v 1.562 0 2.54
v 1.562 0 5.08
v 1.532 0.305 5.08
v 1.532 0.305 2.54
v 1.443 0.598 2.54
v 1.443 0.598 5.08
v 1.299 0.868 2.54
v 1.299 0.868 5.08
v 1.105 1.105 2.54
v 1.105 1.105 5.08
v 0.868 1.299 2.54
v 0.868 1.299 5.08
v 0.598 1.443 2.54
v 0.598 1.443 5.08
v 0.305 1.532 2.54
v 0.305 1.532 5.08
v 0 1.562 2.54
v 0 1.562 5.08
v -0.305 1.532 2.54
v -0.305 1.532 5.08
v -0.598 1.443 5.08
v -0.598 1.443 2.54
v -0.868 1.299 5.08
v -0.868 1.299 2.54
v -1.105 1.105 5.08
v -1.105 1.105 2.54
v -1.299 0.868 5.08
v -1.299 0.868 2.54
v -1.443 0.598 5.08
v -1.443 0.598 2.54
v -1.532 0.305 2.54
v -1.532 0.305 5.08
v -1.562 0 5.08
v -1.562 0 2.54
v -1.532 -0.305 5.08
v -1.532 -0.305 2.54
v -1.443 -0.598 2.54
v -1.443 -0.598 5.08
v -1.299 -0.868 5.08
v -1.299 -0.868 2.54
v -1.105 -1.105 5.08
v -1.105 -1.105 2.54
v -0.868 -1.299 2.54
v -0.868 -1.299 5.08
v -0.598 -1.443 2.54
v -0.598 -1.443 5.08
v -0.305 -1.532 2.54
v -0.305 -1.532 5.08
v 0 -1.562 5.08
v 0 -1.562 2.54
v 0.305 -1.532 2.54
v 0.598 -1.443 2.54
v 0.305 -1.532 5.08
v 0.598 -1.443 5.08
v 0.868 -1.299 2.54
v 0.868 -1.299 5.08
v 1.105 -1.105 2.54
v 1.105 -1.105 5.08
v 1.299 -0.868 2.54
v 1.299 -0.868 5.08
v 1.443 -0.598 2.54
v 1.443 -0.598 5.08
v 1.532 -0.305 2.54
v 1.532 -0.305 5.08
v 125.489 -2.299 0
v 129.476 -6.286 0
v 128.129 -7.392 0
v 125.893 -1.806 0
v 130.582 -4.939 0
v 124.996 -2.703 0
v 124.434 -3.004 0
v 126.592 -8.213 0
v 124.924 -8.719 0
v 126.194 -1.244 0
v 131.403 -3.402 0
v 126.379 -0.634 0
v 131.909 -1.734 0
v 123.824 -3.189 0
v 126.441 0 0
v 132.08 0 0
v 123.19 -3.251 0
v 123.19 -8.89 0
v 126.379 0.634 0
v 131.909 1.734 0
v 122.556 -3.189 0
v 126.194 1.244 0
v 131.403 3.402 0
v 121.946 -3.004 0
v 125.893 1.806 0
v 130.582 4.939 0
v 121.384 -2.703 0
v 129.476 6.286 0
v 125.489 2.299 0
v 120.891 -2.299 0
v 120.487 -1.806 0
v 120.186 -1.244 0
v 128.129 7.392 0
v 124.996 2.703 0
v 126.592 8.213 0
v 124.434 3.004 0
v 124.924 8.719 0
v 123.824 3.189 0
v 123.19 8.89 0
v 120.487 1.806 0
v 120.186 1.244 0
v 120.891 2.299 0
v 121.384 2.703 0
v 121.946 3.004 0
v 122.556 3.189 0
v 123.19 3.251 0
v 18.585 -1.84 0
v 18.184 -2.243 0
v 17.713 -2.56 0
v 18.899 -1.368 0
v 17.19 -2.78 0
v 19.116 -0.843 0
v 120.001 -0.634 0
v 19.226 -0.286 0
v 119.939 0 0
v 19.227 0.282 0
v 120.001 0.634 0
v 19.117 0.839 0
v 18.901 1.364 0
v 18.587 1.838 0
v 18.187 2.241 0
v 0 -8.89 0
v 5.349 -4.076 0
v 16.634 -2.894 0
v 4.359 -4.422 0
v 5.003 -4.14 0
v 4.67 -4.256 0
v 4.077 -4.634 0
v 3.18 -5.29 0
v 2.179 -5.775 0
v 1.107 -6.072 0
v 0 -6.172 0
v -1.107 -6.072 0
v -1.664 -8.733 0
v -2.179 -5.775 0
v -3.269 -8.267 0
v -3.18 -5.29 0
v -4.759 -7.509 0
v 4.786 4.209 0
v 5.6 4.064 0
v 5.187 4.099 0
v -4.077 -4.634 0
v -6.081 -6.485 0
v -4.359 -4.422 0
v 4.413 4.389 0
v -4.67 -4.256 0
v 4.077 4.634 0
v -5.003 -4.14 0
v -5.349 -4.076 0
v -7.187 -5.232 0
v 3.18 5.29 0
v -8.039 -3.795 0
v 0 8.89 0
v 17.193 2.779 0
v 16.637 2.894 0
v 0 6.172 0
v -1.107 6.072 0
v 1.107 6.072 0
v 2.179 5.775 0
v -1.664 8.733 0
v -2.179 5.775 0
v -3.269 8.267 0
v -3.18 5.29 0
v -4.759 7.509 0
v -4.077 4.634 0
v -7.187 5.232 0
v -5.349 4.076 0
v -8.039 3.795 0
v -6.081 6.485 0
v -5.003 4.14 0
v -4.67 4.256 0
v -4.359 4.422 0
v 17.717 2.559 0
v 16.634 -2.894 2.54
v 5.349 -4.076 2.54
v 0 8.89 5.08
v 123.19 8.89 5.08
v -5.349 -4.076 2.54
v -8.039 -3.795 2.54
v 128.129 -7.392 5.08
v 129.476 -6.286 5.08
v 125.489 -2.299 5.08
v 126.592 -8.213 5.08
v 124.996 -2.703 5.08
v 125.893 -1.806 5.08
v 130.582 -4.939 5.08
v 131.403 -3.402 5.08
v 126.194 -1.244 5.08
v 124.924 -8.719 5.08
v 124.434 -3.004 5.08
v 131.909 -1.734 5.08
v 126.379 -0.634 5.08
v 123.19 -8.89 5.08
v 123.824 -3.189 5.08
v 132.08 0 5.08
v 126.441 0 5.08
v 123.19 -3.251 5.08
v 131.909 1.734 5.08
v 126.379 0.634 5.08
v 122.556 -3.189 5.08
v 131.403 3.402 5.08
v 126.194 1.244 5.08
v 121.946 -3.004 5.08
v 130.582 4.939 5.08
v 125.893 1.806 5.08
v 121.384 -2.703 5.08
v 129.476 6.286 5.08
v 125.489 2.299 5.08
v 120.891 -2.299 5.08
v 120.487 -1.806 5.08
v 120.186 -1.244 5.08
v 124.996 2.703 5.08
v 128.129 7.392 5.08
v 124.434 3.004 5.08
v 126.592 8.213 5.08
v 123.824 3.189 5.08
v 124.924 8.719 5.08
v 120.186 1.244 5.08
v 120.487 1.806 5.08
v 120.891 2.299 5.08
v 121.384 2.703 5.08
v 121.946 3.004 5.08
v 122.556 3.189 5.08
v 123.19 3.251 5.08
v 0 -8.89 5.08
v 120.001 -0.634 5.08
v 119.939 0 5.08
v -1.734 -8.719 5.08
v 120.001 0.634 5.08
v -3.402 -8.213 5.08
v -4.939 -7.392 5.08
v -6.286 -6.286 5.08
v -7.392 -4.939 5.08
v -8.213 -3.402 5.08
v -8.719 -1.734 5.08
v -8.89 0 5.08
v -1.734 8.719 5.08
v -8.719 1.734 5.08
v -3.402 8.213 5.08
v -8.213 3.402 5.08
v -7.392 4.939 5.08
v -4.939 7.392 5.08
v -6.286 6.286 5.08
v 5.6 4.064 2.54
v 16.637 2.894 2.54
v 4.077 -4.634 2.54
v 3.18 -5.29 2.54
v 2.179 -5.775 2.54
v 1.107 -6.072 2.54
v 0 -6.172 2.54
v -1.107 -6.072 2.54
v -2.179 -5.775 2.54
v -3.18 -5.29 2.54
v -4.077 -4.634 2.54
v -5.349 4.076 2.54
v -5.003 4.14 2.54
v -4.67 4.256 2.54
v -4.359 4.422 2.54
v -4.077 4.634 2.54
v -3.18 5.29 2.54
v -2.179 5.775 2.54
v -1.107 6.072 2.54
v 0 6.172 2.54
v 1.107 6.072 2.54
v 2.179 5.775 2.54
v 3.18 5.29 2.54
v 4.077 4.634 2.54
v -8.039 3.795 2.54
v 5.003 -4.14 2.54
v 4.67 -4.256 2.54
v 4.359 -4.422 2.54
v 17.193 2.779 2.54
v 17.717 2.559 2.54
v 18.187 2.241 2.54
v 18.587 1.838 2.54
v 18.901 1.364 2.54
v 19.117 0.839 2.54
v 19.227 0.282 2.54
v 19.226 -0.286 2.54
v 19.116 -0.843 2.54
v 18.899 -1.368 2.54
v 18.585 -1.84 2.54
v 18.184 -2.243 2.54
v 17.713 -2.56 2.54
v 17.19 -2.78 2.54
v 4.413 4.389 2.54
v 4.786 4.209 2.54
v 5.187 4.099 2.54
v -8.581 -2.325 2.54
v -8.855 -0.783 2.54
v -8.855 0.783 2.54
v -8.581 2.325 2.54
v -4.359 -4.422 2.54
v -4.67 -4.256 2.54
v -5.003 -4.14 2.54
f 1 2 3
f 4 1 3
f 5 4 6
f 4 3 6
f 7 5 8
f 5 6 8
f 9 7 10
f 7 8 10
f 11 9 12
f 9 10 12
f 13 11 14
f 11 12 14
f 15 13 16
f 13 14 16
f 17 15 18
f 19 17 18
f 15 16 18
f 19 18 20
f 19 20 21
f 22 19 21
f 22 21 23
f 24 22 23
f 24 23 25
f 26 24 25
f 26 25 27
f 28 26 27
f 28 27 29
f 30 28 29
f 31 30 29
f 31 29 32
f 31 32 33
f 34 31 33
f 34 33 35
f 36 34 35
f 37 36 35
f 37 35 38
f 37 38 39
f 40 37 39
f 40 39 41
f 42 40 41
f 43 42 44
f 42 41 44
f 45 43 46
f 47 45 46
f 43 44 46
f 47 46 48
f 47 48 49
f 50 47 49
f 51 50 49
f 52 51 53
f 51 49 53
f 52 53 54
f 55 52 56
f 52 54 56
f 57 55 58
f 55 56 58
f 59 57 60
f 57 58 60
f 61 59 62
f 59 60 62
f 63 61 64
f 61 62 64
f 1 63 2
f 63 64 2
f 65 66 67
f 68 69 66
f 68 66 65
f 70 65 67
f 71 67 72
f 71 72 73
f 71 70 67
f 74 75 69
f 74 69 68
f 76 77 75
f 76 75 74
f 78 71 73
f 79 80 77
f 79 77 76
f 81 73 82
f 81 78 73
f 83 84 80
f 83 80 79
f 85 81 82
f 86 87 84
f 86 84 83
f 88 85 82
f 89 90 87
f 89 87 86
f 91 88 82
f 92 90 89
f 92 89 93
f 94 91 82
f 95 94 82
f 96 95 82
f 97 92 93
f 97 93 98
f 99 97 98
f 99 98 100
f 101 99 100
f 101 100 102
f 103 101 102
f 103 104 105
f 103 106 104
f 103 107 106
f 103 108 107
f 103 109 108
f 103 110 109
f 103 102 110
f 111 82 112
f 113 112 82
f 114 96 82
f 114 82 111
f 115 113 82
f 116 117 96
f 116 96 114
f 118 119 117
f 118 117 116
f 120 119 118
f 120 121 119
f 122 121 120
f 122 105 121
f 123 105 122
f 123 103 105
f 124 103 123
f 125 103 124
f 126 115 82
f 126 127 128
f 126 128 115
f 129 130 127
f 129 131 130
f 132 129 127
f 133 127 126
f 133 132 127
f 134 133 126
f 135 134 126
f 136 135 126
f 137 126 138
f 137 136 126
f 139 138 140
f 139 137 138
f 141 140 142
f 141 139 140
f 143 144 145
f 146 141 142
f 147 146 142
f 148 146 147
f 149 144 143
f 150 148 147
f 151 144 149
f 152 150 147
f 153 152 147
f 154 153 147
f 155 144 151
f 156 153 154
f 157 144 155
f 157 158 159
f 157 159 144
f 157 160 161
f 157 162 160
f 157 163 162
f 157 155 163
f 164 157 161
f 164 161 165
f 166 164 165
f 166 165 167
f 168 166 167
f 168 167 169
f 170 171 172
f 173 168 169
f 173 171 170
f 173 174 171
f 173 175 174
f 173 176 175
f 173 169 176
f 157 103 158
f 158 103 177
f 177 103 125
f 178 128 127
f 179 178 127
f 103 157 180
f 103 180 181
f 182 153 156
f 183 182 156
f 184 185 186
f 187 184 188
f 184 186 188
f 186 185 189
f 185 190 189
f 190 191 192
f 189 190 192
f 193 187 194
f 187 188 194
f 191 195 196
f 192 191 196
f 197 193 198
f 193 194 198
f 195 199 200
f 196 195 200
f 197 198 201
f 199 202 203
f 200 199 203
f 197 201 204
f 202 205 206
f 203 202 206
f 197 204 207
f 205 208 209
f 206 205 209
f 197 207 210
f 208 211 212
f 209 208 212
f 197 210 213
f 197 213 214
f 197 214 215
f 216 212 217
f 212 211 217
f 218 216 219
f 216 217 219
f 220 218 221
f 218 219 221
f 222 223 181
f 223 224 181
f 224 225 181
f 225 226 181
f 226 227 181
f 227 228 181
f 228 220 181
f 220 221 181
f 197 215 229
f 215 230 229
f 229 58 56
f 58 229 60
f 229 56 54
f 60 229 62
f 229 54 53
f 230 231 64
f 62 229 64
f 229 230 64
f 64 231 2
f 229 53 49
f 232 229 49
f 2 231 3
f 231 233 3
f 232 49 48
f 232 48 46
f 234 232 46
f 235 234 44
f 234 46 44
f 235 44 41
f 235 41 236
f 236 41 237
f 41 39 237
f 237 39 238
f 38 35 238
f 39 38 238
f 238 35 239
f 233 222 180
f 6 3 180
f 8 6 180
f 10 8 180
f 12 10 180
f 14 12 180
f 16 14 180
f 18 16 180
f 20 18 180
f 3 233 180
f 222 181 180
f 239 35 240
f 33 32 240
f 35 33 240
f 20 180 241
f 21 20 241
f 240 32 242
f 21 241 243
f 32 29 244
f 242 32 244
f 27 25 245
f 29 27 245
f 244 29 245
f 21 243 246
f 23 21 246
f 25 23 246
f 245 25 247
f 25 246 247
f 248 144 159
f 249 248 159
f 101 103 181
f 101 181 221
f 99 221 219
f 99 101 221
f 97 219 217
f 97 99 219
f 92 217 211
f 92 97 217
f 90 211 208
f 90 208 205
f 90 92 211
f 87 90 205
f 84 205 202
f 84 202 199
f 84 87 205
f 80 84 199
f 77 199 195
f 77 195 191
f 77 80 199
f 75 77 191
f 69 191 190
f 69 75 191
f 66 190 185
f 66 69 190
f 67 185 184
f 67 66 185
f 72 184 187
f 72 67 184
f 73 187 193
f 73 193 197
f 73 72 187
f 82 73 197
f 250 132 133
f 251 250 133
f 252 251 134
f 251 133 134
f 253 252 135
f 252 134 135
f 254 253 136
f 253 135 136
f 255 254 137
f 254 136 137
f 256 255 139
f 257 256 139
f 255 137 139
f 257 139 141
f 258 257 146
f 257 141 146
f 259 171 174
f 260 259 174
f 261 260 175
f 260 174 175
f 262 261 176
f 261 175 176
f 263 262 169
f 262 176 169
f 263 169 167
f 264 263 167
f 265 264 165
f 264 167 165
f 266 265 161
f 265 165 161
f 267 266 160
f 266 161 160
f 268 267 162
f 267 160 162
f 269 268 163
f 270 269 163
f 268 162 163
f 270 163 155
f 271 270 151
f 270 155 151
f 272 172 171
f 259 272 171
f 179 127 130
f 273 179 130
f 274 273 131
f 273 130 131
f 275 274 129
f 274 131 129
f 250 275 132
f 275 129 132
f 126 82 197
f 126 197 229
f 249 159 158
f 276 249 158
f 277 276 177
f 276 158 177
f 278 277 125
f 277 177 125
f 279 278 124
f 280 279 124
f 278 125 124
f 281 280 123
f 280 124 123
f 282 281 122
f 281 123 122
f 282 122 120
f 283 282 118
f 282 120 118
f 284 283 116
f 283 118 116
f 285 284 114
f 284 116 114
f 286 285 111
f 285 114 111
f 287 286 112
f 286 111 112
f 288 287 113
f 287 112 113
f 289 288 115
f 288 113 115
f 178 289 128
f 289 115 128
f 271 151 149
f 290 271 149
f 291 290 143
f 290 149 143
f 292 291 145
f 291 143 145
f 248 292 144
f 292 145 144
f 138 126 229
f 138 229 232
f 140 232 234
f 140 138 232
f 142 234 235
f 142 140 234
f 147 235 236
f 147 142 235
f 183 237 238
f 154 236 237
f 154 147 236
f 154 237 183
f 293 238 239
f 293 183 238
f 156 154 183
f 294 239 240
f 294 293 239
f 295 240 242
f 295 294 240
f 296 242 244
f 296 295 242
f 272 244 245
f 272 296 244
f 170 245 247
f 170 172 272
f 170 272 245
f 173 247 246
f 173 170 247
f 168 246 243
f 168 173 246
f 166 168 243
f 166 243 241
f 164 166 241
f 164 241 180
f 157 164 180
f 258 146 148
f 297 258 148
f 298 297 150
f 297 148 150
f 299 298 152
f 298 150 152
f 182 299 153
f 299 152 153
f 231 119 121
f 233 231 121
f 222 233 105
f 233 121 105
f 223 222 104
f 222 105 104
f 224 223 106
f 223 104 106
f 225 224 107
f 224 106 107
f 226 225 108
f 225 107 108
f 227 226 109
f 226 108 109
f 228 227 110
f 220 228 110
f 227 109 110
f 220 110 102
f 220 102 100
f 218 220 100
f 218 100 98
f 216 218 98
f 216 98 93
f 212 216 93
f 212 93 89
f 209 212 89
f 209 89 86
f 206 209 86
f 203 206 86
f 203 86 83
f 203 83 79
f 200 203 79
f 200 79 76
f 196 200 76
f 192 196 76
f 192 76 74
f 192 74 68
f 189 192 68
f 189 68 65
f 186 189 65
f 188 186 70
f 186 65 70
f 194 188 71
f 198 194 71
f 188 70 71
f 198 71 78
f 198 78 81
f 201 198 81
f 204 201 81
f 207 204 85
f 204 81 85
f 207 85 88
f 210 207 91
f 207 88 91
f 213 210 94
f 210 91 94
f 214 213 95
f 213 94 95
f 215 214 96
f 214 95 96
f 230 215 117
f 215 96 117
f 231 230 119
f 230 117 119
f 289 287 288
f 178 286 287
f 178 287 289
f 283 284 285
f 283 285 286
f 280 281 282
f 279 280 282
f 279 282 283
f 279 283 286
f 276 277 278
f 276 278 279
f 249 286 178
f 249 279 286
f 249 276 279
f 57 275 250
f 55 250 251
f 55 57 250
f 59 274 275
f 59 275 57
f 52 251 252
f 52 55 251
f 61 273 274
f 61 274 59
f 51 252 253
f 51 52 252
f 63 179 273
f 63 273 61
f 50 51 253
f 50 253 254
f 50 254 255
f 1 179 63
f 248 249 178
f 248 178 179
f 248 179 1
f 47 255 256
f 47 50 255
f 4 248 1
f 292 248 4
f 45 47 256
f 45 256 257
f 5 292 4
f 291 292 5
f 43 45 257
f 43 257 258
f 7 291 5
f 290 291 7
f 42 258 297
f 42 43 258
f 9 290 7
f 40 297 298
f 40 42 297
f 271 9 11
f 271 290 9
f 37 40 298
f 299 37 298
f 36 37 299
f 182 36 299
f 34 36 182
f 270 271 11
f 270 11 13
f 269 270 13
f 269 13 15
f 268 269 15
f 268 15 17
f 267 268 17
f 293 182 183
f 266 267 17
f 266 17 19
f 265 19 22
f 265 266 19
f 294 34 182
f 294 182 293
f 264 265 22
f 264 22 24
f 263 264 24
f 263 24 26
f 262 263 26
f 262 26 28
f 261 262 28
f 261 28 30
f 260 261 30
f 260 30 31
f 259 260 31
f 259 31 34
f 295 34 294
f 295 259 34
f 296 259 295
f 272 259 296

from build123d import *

# Parameters (mm, degrees)
BOSS_EXTRUDE1_DEPTH = 5.08
CUT_EXTRUDE1_DEPTH  = 2.54
SKETCH5_R           = 1.5621
CUT_EXTRUDE2_DEPTH  = 133.476280518
SKETCH2_R           = 3.2512
CUT_EXTRUDE3_DEPTH  = 133.476280518


with BuildPart() as part:
    # Sketch1 → Boss-Extrude1 (new body)
    with BuildSketch(Plane.XY):
        with BuildLine():
            Line((0, 8.89), (123.19, 8.89))
            ThreePointArc((123.19, 8.89), (132.08, 0), (123.19, -8.89))
            Line((123.19, -8.89), (0, -8.89))
            ThreePointArc((0, -8.89), (-8.89, 0), (0, 8.89))
        make_face()
    extrude(amount=BOSS_EXTRUDE1_DEPTH)

    # Sketch4 → Cut-Extrude1 (cut)
    with BuildSketch(Plane(origin=(0, 0, 0), x_dir=(-1, 0, 0), z_dir=(0, 0, -1))):
        with BuildLine():
            Line((-5.600440074, 4.064037393), (-16.637267213, 2.893836949))
            ThreePointArc((-16.637267213, 2.893836949), (-19.240499434, -0.001815049), (-16.63365711, -2.89421744))
            Line((-16.63365711, -2.89421744), (-5.349174405, -4.076443038))
            ThreePointArc((-5.349174405, -4.076443038), (-4.669876023, -4.256197229), (-4.077266325, -4.633783784))
            ThreePointArc((-4.077266325, -4.633783784), (0, -6.1722), (4.077266325, -4.633783784))
            ThreePointArc((4.077266325, -4.633783784), (4.669876023, -4.256197229), (5.349174405, -4.076443038))
            Line((5.349174405, -4.076443038), (16.63365711, -2.89421744))
            ThreePointArc((16.63365711, -2.89421744), (19.2405, 0), (16.63365711, 2.89421744))
            Line((16.63365711, 2.89421744), (5.349174405, 4.076443038))
            ThreePointArc((5.349174405, 4.076443038), (4.669876023, 4.256197229), (4.077266325, 4.633783784))
            ThreePointArc((4.077266325, 4.633783784), (0, 6.1722), (-4.077266325, 4.633783784))
            ThreePointArc((-4.077266325, 4.633783784), (-4.786476333, 4.20888501), (-5.600440074, 4.064037393))
        make_face()
    extrude(amount=-CUT_EXTRUDE1_DEPTH, mode=Mode.SUBTRACT)

    # Sketch5 → Cut-Extrude2 (cut, through all)
    with BuildSketch(Plane.XY.offset(5.08)):
        Circle(SKETCH5_R)
    extrude(amount=-CUT_EXTRUDE2_DEPTH, mode=Mode.SUBTRACT)

    # Sketch2 → Cut-Extrude3 (cut, through all)
    with BuildSketch(Plane(origin=(0, 0, 0), x_dir=(-1, 0, 0), z_dir=(0, 0, -1))):
        with Locations((-123.19, 0)):
            Circle(SKETCH2_R)
    extrude(amount=-CUT_EXTRUDE3_DEPTH, mode=Mode.SUBTRACT)


solid = part.part
